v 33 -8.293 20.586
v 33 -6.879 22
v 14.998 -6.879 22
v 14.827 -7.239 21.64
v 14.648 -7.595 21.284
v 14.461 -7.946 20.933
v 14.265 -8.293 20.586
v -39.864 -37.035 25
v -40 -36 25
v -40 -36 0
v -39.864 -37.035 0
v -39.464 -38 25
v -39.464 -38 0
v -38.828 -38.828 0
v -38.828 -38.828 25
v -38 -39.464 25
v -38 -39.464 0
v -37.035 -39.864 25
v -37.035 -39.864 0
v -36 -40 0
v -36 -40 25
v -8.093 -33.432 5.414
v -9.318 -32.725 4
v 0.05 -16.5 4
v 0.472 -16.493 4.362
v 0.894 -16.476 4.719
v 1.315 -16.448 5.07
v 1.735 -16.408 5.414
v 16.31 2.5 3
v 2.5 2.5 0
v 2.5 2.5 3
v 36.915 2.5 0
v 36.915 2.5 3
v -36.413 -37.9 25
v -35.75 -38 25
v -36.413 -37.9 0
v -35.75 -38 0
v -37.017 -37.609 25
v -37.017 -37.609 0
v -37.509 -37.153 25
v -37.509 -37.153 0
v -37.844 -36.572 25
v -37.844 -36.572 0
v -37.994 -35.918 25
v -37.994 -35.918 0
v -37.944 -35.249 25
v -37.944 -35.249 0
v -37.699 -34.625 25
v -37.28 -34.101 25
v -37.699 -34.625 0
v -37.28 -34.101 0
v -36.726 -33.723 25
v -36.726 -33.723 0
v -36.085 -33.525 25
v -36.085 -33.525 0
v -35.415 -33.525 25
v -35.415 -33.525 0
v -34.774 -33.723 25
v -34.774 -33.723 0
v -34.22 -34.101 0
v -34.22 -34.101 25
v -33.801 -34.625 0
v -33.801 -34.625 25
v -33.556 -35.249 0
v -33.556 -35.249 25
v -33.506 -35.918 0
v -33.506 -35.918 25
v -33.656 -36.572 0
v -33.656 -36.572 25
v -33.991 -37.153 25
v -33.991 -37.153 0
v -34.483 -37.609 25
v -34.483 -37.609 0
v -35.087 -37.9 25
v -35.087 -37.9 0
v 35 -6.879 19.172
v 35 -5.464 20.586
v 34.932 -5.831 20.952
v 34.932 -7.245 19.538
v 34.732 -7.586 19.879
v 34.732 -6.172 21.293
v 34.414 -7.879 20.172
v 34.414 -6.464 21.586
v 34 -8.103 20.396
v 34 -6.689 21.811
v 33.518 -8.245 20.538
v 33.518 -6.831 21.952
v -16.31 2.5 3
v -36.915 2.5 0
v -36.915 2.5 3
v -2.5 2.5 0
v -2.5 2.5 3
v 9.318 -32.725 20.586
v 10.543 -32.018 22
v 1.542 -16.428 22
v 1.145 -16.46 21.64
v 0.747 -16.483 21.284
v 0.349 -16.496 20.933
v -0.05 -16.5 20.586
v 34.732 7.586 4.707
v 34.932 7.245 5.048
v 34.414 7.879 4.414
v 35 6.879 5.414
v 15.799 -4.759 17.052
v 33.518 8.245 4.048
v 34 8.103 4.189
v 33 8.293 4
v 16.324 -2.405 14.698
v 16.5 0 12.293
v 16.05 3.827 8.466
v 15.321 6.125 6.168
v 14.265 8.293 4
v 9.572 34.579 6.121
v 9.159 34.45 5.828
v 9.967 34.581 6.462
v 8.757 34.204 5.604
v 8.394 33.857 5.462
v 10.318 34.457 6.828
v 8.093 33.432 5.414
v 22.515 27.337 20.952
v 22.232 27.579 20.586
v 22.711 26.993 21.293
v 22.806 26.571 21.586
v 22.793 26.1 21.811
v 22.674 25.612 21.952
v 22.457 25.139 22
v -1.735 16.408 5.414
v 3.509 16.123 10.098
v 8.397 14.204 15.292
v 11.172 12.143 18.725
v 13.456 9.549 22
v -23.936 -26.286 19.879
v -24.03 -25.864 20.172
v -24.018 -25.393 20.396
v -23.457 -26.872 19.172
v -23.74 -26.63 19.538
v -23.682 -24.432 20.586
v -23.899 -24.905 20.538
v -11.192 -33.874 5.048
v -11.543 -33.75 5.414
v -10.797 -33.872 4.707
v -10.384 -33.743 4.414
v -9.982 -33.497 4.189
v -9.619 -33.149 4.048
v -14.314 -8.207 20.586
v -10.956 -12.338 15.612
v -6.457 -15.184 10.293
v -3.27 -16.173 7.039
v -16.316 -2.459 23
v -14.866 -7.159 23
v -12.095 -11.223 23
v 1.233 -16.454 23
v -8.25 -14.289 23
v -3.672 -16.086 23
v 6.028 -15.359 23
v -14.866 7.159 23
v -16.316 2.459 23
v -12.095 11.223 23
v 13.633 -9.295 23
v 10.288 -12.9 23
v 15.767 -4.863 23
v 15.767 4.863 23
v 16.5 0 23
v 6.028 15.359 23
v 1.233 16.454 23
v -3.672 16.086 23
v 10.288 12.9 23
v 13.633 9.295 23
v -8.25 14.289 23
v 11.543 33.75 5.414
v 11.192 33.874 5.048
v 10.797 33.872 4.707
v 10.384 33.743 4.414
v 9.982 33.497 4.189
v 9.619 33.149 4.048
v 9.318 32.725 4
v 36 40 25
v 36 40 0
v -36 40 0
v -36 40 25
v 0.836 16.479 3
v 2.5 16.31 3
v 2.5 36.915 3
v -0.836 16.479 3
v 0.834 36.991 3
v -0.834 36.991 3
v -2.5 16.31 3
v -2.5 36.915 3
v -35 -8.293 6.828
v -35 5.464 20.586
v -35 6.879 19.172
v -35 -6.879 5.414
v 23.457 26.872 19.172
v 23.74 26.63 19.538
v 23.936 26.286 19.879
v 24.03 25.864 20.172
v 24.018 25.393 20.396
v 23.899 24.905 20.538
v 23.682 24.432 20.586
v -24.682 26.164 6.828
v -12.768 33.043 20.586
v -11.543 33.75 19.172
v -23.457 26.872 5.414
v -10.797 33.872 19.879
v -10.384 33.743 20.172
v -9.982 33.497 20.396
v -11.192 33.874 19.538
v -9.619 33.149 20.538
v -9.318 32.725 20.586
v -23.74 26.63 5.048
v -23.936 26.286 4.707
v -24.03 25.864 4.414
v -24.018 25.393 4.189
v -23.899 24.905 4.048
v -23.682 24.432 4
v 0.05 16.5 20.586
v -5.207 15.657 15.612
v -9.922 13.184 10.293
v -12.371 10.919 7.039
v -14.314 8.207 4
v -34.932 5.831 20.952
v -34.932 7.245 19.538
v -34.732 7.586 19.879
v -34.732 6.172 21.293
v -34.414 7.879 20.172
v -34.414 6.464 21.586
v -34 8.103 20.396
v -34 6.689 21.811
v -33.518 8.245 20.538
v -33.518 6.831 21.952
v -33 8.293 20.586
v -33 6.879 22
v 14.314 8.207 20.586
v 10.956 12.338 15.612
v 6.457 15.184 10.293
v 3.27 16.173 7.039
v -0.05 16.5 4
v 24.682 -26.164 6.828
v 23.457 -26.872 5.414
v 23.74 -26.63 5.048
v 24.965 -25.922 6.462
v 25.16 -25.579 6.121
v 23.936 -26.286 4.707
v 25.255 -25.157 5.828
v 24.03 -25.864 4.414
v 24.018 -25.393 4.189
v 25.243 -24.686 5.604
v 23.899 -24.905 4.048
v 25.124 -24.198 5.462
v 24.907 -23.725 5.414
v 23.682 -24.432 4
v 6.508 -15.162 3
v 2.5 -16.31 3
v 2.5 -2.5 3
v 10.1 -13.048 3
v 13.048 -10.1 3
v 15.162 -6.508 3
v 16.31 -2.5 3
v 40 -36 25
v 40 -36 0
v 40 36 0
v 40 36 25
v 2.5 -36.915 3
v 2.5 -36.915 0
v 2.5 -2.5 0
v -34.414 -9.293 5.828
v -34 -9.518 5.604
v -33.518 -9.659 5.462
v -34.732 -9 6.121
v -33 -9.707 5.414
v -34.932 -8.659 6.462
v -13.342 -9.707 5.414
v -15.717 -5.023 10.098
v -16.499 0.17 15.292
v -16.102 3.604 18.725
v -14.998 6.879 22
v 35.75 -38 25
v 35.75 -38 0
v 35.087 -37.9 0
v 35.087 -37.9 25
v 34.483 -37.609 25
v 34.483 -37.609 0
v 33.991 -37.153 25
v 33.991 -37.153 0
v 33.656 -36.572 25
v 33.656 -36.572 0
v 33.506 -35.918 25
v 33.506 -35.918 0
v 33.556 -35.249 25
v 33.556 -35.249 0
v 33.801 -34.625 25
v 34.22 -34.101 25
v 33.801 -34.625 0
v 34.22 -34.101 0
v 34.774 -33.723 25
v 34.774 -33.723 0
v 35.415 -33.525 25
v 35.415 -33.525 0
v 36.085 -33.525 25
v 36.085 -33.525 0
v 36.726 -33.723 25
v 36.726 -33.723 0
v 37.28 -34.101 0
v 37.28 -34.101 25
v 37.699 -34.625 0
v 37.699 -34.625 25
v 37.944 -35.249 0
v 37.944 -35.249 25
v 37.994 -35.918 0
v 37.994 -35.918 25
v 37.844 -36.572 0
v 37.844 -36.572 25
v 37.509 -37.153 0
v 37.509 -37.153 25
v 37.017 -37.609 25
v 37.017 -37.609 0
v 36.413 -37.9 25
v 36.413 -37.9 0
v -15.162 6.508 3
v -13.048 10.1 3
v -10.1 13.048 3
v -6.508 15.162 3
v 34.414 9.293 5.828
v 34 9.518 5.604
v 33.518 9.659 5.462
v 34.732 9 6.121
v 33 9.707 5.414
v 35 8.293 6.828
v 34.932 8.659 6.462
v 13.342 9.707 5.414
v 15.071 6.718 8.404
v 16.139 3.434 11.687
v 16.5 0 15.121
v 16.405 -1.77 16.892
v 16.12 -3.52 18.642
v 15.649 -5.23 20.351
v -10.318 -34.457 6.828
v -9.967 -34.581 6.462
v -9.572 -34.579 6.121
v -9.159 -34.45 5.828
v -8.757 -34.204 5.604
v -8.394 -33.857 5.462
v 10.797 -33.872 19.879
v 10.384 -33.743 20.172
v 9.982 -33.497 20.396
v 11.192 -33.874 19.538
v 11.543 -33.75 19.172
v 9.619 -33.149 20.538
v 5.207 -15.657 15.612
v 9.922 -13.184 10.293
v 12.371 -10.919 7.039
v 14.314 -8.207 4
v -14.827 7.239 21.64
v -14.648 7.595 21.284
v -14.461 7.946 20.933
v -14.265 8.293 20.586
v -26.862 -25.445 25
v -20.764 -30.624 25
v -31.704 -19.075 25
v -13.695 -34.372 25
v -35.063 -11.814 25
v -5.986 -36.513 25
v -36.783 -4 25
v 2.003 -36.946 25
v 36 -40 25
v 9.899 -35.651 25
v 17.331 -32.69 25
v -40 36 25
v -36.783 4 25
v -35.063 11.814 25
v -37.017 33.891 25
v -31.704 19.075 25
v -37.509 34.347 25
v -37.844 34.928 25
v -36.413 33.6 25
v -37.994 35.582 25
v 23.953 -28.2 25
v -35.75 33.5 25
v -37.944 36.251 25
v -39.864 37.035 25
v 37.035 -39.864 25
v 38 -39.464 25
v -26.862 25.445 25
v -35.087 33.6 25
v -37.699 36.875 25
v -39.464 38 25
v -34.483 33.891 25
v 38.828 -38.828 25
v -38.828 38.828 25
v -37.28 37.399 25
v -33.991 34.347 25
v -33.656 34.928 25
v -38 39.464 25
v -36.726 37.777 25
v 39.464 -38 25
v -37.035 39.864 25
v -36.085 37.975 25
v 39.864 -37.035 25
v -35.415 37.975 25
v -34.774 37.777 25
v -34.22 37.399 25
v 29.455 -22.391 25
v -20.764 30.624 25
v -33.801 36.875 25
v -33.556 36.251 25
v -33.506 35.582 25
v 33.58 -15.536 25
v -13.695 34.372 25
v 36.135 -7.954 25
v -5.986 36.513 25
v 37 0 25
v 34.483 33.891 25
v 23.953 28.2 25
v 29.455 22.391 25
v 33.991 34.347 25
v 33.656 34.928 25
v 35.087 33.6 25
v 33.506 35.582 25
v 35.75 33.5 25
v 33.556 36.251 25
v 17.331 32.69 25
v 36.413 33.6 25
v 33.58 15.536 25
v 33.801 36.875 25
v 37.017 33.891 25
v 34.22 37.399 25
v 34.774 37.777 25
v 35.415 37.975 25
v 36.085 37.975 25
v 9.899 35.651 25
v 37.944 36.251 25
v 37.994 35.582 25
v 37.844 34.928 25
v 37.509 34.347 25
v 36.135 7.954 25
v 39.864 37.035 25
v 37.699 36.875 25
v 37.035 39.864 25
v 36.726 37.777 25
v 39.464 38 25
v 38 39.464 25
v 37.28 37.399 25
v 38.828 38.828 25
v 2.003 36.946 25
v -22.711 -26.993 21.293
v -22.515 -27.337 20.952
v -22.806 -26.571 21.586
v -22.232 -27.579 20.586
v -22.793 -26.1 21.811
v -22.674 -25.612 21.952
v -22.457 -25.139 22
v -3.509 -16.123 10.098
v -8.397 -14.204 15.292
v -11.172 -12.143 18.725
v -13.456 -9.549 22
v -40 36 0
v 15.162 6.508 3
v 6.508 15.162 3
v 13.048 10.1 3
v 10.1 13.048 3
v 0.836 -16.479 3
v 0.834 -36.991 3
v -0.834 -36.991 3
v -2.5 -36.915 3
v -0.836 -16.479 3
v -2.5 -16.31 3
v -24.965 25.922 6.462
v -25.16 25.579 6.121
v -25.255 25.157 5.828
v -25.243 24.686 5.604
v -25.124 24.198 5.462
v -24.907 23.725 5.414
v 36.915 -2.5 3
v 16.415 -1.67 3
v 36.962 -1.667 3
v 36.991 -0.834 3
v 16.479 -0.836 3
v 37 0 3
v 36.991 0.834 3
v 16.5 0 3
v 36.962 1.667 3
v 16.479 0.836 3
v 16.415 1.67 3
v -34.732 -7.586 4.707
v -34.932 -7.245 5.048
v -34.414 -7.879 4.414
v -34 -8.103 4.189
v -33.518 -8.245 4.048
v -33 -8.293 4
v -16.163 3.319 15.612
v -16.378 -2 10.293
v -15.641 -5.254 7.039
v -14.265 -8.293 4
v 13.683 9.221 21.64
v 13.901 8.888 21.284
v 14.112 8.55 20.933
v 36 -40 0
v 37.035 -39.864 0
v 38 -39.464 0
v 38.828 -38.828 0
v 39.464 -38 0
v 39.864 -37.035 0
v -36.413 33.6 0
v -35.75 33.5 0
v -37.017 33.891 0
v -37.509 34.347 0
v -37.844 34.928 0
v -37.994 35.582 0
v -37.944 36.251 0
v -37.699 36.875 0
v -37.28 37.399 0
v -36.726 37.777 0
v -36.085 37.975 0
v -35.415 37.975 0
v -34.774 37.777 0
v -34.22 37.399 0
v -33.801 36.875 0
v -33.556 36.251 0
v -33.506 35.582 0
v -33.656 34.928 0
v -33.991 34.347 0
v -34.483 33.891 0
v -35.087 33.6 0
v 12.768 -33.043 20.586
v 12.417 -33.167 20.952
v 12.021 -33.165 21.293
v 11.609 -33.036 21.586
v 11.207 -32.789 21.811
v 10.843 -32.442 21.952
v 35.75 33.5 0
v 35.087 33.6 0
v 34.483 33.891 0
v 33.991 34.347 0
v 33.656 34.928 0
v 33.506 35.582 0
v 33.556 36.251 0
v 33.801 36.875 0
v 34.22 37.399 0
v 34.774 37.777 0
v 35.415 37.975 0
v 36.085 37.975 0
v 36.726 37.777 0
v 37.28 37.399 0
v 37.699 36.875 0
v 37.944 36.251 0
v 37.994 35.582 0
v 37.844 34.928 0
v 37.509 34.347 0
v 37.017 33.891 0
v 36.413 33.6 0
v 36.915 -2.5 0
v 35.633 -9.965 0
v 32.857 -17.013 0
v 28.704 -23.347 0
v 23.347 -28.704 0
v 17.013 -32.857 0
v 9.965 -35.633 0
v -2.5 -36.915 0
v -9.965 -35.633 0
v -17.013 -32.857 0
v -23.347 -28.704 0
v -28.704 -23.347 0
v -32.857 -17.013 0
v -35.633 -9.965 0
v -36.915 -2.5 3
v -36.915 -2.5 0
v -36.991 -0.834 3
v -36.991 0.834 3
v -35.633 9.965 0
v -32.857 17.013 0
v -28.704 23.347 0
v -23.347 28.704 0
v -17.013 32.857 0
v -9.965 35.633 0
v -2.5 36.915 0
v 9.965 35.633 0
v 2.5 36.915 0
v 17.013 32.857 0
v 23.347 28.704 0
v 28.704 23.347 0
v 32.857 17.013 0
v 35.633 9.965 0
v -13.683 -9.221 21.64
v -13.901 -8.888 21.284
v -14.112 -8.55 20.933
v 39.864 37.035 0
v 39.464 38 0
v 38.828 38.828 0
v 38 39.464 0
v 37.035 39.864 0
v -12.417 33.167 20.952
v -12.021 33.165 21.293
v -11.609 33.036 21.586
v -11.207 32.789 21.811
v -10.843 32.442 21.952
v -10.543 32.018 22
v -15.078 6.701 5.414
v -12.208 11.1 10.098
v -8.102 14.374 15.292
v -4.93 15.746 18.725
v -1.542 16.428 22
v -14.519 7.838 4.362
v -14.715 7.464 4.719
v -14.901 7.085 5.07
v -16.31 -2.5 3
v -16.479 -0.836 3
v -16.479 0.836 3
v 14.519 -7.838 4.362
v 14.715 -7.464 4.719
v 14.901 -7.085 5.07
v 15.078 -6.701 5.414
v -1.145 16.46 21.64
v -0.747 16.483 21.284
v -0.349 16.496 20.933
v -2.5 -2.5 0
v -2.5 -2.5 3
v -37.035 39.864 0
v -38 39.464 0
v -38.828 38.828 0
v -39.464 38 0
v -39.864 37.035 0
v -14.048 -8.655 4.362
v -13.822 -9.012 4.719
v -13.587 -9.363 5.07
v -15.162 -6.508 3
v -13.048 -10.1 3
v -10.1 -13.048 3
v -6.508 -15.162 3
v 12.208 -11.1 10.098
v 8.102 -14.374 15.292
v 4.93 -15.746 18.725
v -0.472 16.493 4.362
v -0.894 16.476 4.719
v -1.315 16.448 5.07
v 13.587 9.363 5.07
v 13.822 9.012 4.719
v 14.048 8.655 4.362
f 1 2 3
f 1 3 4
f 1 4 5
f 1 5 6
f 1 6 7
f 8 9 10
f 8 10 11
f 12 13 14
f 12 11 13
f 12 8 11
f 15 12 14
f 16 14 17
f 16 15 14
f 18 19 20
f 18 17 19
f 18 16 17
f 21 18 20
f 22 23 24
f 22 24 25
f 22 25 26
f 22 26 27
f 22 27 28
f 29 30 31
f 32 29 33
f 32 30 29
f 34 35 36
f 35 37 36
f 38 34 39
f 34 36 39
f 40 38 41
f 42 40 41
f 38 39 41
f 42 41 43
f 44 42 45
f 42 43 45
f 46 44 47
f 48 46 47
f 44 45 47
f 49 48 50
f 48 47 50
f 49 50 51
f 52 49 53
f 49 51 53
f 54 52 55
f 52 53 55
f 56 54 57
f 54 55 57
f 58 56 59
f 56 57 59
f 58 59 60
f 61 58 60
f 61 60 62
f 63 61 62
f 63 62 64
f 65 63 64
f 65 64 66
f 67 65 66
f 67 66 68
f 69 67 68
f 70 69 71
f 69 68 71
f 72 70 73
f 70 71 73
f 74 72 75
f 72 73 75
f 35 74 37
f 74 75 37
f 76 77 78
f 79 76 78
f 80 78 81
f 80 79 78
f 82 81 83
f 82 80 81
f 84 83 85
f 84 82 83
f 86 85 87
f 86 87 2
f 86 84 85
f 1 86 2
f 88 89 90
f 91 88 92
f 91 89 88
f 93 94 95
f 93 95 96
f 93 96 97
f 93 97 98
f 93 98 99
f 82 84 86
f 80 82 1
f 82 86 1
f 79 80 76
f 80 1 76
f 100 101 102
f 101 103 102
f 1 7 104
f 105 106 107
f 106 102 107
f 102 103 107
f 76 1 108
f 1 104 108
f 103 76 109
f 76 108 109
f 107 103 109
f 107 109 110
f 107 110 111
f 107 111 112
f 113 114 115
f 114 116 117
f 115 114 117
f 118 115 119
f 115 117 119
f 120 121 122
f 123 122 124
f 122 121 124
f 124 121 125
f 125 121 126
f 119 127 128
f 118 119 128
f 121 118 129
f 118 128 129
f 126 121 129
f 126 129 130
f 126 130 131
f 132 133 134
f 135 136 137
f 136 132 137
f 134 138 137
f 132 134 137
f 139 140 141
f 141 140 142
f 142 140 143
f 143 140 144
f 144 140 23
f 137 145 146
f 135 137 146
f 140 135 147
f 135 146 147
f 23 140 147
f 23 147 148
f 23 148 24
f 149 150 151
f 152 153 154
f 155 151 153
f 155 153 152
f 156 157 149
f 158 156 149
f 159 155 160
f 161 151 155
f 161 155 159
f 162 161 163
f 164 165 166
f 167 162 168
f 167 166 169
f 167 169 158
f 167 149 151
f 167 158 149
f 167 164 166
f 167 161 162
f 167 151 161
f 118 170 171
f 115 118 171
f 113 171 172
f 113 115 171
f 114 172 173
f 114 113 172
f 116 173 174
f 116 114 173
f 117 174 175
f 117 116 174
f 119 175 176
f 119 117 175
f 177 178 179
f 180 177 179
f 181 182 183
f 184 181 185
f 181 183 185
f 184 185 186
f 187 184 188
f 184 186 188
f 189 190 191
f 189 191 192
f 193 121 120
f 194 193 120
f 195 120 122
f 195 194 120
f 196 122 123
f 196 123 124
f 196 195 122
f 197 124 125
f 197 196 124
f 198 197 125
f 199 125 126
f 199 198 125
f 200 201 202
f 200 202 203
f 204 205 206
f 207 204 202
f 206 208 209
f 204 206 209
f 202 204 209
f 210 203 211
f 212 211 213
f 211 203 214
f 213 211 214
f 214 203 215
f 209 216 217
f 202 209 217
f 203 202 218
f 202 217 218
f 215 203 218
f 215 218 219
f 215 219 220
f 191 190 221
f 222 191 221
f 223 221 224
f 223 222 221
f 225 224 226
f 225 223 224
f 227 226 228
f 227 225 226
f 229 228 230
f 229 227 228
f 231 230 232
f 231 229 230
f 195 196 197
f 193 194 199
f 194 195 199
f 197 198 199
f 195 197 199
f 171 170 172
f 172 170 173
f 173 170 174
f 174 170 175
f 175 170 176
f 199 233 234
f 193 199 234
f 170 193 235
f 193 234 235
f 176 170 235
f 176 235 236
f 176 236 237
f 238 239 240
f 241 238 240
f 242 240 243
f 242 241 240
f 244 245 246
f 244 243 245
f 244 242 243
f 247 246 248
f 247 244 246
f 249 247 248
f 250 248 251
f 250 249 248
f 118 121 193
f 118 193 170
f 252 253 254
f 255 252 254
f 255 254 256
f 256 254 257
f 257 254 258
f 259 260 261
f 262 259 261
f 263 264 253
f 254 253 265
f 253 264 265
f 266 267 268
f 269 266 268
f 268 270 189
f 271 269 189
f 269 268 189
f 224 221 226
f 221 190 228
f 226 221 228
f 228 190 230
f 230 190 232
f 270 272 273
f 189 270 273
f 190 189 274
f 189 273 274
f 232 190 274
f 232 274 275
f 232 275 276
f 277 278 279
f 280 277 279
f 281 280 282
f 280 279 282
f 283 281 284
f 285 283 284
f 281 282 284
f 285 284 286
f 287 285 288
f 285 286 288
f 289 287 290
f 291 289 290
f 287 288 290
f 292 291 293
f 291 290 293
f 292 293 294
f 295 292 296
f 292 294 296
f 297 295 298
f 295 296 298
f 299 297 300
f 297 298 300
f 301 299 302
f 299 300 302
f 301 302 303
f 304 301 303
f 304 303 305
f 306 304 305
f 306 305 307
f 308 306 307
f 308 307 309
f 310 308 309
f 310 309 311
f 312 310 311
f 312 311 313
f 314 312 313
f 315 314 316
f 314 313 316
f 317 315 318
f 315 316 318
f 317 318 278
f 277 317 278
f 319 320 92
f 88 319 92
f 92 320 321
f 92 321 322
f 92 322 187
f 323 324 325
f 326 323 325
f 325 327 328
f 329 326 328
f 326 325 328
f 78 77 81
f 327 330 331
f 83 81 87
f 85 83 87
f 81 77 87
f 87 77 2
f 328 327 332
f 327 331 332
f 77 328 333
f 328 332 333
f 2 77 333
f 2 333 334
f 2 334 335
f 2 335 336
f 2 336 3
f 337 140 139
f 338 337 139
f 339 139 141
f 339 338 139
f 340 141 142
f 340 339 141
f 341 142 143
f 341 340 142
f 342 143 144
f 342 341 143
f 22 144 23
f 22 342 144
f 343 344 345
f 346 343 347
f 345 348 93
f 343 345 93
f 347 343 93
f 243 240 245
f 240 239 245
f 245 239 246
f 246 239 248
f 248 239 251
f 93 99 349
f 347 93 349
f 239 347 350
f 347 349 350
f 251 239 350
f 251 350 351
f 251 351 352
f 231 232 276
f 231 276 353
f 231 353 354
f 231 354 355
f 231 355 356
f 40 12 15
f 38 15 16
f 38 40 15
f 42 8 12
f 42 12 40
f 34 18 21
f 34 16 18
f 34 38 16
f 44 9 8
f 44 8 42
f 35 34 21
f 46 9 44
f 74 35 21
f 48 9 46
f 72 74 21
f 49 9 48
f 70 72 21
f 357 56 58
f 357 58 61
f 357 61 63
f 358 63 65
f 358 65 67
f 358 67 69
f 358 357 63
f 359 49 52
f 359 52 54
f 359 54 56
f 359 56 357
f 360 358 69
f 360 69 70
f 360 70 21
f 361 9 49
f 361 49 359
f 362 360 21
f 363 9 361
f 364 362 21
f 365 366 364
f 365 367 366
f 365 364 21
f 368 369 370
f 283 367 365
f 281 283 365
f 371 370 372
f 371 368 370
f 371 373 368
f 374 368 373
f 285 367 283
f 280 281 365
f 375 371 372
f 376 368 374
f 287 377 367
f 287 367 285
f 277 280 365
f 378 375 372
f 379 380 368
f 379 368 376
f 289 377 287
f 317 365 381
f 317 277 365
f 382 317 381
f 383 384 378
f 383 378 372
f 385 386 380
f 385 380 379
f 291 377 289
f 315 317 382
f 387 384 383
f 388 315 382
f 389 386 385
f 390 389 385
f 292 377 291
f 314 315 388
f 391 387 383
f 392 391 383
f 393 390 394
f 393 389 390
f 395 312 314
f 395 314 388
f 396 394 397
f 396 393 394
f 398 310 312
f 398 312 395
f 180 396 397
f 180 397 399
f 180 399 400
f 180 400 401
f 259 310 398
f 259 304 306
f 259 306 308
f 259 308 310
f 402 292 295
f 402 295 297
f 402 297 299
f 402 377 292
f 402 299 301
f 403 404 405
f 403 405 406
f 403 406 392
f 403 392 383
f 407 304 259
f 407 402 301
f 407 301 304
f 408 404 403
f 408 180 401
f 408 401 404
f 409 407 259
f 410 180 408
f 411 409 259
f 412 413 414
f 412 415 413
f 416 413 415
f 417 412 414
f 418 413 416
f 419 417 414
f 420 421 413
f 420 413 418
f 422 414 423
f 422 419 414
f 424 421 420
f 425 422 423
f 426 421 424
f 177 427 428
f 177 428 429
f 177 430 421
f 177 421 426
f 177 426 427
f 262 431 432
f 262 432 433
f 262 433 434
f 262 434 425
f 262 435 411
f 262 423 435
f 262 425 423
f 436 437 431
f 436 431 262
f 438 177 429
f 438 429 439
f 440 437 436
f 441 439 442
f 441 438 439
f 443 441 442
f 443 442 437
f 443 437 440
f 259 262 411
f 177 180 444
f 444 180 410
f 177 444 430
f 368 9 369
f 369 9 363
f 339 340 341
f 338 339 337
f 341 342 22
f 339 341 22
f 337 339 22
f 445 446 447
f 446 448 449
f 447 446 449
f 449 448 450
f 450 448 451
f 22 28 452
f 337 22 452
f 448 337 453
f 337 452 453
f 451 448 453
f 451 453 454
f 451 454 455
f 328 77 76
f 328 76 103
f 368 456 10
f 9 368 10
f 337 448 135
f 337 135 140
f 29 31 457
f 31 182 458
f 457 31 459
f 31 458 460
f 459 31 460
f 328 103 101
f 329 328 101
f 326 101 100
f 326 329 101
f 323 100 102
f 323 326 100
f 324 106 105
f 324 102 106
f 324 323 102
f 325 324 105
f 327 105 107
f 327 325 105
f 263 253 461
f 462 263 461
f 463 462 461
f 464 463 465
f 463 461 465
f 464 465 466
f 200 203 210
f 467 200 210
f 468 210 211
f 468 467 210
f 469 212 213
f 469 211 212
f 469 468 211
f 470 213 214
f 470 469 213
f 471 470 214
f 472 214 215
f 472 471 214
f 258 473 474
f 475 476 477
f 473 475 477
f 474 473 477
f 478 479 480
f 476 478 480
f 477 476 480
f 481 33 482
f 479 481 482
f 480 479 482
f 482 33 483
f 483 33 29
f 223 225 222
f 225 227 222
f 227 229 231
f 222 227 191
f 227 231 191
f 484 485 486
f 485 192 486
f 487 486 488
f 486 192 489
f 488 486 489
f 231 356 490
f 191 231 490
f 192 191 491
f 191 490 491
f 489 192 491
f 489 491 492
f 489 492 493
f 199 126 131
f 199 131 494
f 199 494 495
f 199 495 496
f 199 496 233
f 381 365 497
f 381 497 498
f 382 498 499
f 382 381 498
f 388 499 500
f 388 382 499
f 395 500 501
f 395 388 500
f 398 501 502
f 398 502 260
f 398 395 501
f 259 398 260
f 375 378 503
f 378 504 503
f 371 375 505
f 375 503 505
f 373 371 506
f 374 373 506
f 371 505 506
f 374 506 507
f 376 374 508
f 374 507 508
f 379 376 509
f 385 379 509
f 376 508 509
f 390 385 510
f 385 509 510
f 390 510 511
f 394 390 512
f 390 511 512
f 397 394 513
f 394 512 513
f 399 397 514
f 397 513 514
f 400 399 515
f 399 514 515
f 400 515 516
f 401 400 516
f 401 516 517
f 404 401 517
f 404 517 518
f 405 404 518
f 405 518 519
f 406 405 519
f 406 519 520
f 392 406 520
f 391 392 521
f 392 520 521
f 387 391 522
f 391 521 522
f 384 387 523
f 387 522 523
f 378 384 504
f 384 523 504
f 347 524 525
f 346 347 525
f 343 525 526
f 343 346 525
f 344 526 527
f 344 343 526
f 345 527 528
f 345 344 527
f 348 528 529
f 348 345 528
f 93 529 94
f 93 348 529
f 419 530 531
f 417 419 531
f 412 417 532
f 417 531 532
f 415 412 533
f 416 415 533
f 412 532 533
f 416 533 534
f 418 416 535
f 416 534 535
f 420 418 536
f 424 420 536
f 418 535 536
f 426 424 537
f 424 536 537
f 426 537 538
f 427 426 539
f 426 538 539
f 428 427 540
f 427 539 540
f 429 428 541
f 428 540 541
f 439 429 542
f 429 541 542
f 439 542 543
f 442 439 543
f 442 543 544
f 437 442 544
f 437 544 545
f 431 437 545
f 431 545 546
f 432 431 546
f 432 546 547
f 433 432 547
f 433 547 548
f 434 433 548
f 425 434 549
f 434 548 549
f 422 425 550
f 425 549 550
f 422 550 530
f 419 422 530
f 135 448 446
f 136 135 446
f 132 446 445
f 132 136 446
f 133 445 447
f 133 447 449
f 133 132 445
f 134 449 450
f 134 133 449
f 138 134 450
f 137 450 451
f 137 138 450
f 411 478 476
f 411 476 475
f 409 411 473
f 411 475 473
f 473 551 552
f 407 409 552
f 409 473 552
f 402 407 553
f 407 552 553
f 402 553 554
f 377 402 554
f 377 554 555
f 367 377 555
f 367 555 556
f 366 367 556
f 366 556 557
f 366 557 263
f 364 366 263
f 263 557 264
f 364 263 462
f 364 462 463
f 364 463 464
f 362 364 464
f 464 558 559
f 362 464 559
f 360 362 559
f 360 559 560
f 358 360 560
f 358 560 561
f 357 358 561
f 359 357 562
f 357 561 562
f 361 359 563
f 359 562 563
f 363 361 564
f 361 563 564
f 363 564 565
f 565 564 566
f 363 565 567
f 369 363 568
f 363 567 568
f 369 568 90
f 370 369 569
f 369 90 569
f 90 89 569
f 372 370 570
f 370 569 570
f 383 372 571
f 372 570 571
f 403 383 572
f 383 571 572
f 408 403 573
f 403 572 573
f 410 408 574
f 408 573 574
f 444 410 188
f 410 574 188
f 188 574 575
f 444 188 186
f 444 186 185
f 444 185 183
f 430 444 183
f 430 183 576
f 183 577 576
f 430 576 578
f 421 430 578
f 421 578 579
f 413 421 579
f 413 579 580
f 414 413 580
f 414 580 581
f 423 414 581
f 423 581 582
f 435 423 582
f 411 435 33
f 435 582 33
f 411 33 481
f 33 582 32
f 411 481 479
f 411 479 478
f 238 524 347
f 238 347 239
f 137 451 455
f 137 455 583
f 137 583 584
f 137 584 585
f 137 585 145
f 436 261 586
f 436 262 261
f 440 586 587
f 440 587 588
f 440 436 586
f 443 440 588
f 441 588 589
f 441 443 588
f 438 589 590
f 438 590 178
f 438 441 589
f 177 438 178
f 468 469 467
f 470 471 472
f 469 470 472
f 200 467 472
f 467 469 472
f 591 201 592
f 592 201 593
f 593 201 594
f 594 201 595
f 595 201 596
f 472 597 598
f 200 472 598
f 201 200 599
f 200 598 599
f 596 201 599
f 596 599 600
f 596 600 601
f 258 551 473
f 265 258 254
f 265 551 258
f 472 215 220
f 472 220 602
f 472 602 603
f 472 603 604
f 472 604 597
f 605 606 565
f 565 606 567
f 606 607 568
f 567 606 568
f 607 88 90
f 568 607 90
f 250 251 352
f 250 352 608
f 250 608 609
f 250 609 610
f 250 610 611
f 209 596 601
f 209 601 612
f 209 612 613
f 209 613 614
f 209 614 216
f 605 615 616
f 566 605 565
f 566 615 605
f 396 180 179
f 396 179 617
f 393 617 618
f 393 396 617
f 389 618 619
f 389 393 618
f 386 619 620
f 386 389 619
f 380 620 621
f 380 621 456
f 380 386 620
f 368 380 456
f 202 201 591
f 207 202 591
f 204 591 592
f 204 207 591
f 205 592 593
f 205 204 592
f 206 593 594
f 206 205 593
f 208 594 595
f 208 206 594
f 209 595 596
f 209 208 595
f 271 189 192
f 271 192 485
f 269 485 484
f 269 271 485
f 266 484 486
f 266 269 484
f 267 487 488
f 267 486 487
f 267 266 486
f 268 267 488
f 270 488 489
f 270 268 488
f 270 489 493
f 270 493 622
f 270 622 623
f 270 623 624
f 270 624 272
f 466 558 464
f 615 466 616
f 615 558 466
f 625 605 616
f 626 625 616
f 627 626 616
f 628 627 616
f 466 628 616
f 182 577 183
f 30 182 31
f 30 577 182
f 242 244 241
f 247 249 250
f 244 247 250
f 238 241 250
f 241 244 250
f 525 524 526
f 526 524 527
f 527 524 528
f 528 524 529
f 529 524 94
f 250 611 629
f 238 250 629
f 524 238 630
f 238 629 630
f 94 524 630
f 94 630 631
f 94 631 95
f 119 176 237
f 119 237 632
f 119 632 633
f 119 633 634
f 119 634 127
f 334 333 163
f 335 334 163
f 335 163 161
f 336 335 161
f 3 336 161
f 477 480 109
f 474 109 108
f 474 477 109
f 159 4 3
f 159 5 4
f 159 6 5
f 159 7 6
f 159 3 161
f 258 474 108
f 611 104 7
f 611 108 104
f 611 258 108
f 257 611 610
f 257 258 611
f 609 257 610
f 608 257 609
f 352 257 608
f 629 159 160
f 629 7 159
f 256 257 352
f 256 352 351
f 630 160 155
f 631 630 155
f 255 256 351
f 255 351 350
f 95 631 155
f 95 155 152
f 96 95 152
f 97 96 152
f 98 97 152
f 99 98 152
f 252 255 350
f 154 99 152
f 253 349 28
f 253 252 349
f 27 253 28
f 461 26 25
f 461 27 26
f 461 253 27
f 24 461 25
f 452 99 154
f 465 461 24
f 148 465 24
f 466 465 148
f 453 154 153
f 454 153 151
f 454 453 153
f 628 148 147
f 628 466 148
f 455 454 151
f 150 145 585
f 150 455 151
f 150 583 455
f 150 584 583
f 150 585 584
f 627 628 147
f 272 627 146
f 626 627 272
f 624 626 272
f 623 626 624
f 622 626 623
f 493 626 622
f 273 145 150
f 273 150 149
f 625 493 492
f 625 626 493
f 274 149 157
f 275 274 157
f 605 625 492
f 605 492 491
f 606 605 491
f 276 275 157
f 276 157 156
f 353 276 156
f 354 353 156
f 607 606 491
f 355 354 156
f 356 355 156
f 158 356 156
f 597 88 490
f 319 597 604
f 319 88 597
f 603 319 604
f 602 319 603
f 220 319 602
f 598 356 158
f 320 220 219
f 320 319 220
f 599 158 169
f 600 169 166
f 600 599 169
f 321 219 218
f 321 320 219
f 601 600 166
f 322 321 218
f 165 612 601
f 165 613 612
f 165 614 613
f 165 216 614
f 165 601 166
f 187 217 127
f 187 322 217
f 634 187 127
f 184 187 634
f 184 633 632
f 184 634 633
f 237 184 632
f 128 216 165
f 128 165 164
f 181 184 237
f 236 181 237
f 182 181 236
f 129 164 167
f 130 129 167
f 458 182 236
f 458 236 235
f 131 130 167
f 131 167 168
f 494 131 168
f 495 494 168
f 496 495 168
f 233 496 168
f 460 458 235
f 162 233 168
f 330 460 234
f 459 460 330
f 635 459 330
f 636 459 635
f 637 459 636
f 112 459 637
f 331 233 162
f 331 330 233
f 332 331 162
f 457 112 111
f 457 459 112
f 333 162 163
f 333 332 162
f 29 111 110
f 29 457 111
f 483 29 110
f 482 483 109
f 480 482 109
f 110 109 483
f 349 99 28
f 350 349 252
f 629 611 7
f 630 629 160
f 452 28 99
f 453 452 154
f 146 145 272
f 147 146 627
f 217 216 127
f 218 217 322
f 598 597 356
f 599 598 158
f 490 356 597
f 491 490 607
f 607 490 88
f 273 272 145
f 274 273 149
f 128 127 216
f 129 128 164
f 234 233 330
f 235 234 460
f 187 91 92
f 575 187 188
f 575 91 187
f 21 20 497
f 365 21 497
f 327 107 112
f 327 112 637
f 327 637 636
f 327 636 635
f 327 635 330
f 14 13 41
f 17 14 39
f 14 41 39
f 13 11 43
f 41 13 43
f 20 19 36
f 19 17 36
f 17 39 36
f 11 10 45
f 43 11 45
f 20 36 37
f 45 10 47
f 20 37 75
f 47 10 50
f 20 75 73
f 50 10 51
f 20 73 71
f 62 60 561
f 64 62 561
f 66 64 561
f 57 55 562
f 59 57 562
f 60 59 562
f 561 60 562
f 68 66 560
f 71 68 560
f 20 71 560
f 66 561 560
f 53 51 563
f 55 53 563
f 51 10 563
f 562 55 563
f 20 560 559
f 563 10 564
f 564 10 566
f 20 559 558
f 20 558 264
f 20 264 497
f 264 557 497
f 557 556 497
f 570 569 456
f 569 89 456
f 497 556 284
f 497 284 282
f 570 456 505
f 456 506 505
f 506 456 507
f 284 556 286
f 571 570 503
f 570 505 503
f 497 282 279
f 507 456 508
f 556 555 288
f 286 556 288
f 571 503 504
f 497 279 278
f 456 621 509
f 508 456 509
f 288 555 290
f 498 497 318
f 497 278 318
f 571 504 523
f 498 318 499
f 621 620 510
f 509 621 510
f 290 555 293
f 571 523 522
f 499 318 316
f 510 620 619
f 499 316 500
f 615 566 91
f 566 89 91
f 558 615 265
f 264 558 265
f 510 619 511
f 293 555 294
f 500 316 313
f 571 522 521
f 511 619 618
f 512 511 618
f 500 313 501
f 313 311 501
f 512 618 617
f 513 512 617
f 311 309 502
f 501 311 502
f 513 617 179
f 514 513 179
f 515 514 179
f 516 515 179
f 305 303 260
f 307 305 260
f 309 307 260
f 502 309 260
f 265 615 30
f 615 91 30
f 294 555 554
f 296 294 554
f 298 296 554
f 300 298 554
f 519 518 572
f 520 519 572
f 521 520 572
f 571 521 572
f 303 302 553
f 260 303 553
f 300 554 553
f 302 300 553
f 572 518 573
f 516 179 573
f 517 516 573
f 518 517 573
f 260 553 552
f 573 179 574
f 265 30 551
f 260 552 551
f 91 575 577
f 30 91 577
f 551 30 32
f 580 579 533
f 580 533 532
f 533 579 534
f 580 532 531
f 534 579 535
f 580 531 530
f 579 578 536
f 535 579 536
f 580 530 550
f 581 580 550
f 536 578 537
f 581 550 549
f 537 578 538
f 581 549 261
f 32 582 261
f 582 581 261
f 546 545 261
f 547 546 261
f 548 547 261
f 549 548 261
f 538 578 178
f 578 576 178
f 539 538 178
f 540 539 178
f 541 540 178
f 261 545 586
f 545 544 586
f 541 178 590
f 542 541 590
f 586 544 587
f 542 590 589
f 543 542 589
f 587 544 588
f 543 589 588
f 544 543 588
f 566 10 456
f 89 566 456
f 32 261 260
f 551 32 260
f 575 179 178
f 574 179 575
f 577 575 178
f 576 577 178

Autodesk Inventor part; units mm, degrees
ref_plane "YZ Plane" through (0, 0, 0) normal (1, 0, 0) x (0, 1, 0)
ref_plane "XZ Plane" through (0, 0, 0) normal (0, 1, 0) x (-1, 0, 0)
ref_plane "XY Plane" through (0, 0, 0) normal (0, 0, 1) x (1, 0, 0)
sketch "Sketch1" plane through (0, 0, 0) normal (0, 0, 1) x (1, 0, 0)
  line L0 (-40, -40) -> (40, -40)
  line L1 (40, -40) -> (40, 40)
  line L2 (40, 40) -> (-40, 40)
  line L3 (-40, 40) -> (-40, -40)
  line L4 (-40, -40) -> (40, 40) construction
  line L5 (40, -40) -> (-40, 40) construction
  circle A0 centre (0, 0) radius 37
  dimension "d0" = 80
  dimension "d1" = 80
  dimension "d2" = 74
extrude "Extrusion1" add sketch "Sketch1" along normal blind 25
sketch "Sketch2" plane through (0, 0, 25) normal (0, 0, 1) x (1, 0, 0)
  line L0 (-35.75, -35.75) -> (35.75, -35.75) construction
  line L1 (35.75, -35.75) -> (35.75, 35.75) construction
  line L2 (35.75, 35.75) -> (-35.75, 35.75) construction
  line L3 (-35.75, 35.75) -> (-35.75, -35.75) construction
  line L4 (-35.75, -35.75) -> (35.75, 35.75) construction
  line L5 (35.75, -35.75) -> (-35.75, 35.75) construction
  point P0 (0, 0)
  dimension "d5" = 71.5
  dimension "d6" = 71.5
hole "Hole1" at (-35.75, 35.75, 25) at (-35.75, -35.75, 25) at (35.75, -35.75, 25) at (35.75, 35.75, 25) direction (0, 0, -1) diameter 4.5 end through all clearance for "Countersunk Flat Head Screw DIN EN ISO 2009" size "M4" standard "DIN"
sketch "Sketch3" plane through (0, 0, 0) normal (0, 0, -1) x (-1, 0, 0)
  line L0 (40, -40) -> (-40, -40) projected
  line L1 (-2.5, -40) -> (2.5, -40)
  line L2 (2.5, -40) -> (2.5, -2.5)
  line L3 (2.5, -2.5) -> (40, -2.5)
  line L4 (40, 40) -> (40, -40) projected
  line L5 (40, -2.5) -> (40, 2.5)
  line L6 (40, 2.5) -> (2.5, 2.5)
  line L7 (2.5, 2.5) -> (2.5, 40)
  line L8 (2.5, 40) -> (-2.5, 40)
  line L9 (-2.5, 40) -> (-2.5, 2.5)
  line L10 (-2.5, 2.5) -> (-40, 2.5)
  line L11 (-40, 2.5) -> (-40, -2.5)
  line L12 (-40, -40) -> (-40, 40) projected
  line L13 (-40, -2.5) -> (-2.5, -2.5)
  line L14 (-2.5, -40) -> (-2.5, -2.5)
  point P0 (0, 0)
  point P1 (-40, 0)
  point P2 (40, 0)
  point P3 (0, -40)
  point P4 (0, 40)
  dimension "d14" = 5
  dimension "d15" = 5
extrude "Extrusion2" add sketch "Sketch3" against normal blind 3 contours L0 L14 L13 L11 L10 L9 L8 L7 L6 L4 L3 L2
sketch "Sketch4" plane through (0, 0, 3) normal (0, 0, 1) x (1, 0, 0)
  circle A0 centre (0, 0) radius 16.5
  dimension "d18" = 33
extrude "Extrusion3" add sketch "Sketch4" along normal blind 20
sketch "Sketch5" plane through (0, 0, 0) normal (1, 0, 0) x (0, 1, 0)
  line L0 (9.7071, 5.4142) -> (-6.8787, 22)
  line L1 (-6.8787, 22) -> (-8.2929, 20.5858)
  line L2 (-8.2929, 20.5858) -> (8.2929, 4)
  line L3 (8.2929, 4) -> (9.7071, 5.4142)
  line L4 (16.3095, 3) -> (36.9154, 3) projected
  line L5 (16.5, 23) -> (-16.5, 23) projected
  point P0 (0, 0)
  point P1 (0, 12.2929)
  dimension "d21" = 1
  dimension "d22" = 1
  dimension "d23" = 2
  dimension "d24" = 45
extrude "Extrusion4" add sketch "Sketch5" along normal blind 35
fillet "Fillet1" radius 2 2 edges at (35, -7.5858, 21.2929) (35, 9, 4.7071)
pattern_circular "Circular Pattern2" count 6 over 360 about axis through (0, 0, -10) along (0, 0, 1) of "Extrusion4", "Fillet1"
fillet "Fillet2" radius 4 4 edges at (40, -40, 12.5) (-40, -40, 12.5) (-40, 40, 12.5) (40, 40, 12.5)
properties part number "Lüfter"
